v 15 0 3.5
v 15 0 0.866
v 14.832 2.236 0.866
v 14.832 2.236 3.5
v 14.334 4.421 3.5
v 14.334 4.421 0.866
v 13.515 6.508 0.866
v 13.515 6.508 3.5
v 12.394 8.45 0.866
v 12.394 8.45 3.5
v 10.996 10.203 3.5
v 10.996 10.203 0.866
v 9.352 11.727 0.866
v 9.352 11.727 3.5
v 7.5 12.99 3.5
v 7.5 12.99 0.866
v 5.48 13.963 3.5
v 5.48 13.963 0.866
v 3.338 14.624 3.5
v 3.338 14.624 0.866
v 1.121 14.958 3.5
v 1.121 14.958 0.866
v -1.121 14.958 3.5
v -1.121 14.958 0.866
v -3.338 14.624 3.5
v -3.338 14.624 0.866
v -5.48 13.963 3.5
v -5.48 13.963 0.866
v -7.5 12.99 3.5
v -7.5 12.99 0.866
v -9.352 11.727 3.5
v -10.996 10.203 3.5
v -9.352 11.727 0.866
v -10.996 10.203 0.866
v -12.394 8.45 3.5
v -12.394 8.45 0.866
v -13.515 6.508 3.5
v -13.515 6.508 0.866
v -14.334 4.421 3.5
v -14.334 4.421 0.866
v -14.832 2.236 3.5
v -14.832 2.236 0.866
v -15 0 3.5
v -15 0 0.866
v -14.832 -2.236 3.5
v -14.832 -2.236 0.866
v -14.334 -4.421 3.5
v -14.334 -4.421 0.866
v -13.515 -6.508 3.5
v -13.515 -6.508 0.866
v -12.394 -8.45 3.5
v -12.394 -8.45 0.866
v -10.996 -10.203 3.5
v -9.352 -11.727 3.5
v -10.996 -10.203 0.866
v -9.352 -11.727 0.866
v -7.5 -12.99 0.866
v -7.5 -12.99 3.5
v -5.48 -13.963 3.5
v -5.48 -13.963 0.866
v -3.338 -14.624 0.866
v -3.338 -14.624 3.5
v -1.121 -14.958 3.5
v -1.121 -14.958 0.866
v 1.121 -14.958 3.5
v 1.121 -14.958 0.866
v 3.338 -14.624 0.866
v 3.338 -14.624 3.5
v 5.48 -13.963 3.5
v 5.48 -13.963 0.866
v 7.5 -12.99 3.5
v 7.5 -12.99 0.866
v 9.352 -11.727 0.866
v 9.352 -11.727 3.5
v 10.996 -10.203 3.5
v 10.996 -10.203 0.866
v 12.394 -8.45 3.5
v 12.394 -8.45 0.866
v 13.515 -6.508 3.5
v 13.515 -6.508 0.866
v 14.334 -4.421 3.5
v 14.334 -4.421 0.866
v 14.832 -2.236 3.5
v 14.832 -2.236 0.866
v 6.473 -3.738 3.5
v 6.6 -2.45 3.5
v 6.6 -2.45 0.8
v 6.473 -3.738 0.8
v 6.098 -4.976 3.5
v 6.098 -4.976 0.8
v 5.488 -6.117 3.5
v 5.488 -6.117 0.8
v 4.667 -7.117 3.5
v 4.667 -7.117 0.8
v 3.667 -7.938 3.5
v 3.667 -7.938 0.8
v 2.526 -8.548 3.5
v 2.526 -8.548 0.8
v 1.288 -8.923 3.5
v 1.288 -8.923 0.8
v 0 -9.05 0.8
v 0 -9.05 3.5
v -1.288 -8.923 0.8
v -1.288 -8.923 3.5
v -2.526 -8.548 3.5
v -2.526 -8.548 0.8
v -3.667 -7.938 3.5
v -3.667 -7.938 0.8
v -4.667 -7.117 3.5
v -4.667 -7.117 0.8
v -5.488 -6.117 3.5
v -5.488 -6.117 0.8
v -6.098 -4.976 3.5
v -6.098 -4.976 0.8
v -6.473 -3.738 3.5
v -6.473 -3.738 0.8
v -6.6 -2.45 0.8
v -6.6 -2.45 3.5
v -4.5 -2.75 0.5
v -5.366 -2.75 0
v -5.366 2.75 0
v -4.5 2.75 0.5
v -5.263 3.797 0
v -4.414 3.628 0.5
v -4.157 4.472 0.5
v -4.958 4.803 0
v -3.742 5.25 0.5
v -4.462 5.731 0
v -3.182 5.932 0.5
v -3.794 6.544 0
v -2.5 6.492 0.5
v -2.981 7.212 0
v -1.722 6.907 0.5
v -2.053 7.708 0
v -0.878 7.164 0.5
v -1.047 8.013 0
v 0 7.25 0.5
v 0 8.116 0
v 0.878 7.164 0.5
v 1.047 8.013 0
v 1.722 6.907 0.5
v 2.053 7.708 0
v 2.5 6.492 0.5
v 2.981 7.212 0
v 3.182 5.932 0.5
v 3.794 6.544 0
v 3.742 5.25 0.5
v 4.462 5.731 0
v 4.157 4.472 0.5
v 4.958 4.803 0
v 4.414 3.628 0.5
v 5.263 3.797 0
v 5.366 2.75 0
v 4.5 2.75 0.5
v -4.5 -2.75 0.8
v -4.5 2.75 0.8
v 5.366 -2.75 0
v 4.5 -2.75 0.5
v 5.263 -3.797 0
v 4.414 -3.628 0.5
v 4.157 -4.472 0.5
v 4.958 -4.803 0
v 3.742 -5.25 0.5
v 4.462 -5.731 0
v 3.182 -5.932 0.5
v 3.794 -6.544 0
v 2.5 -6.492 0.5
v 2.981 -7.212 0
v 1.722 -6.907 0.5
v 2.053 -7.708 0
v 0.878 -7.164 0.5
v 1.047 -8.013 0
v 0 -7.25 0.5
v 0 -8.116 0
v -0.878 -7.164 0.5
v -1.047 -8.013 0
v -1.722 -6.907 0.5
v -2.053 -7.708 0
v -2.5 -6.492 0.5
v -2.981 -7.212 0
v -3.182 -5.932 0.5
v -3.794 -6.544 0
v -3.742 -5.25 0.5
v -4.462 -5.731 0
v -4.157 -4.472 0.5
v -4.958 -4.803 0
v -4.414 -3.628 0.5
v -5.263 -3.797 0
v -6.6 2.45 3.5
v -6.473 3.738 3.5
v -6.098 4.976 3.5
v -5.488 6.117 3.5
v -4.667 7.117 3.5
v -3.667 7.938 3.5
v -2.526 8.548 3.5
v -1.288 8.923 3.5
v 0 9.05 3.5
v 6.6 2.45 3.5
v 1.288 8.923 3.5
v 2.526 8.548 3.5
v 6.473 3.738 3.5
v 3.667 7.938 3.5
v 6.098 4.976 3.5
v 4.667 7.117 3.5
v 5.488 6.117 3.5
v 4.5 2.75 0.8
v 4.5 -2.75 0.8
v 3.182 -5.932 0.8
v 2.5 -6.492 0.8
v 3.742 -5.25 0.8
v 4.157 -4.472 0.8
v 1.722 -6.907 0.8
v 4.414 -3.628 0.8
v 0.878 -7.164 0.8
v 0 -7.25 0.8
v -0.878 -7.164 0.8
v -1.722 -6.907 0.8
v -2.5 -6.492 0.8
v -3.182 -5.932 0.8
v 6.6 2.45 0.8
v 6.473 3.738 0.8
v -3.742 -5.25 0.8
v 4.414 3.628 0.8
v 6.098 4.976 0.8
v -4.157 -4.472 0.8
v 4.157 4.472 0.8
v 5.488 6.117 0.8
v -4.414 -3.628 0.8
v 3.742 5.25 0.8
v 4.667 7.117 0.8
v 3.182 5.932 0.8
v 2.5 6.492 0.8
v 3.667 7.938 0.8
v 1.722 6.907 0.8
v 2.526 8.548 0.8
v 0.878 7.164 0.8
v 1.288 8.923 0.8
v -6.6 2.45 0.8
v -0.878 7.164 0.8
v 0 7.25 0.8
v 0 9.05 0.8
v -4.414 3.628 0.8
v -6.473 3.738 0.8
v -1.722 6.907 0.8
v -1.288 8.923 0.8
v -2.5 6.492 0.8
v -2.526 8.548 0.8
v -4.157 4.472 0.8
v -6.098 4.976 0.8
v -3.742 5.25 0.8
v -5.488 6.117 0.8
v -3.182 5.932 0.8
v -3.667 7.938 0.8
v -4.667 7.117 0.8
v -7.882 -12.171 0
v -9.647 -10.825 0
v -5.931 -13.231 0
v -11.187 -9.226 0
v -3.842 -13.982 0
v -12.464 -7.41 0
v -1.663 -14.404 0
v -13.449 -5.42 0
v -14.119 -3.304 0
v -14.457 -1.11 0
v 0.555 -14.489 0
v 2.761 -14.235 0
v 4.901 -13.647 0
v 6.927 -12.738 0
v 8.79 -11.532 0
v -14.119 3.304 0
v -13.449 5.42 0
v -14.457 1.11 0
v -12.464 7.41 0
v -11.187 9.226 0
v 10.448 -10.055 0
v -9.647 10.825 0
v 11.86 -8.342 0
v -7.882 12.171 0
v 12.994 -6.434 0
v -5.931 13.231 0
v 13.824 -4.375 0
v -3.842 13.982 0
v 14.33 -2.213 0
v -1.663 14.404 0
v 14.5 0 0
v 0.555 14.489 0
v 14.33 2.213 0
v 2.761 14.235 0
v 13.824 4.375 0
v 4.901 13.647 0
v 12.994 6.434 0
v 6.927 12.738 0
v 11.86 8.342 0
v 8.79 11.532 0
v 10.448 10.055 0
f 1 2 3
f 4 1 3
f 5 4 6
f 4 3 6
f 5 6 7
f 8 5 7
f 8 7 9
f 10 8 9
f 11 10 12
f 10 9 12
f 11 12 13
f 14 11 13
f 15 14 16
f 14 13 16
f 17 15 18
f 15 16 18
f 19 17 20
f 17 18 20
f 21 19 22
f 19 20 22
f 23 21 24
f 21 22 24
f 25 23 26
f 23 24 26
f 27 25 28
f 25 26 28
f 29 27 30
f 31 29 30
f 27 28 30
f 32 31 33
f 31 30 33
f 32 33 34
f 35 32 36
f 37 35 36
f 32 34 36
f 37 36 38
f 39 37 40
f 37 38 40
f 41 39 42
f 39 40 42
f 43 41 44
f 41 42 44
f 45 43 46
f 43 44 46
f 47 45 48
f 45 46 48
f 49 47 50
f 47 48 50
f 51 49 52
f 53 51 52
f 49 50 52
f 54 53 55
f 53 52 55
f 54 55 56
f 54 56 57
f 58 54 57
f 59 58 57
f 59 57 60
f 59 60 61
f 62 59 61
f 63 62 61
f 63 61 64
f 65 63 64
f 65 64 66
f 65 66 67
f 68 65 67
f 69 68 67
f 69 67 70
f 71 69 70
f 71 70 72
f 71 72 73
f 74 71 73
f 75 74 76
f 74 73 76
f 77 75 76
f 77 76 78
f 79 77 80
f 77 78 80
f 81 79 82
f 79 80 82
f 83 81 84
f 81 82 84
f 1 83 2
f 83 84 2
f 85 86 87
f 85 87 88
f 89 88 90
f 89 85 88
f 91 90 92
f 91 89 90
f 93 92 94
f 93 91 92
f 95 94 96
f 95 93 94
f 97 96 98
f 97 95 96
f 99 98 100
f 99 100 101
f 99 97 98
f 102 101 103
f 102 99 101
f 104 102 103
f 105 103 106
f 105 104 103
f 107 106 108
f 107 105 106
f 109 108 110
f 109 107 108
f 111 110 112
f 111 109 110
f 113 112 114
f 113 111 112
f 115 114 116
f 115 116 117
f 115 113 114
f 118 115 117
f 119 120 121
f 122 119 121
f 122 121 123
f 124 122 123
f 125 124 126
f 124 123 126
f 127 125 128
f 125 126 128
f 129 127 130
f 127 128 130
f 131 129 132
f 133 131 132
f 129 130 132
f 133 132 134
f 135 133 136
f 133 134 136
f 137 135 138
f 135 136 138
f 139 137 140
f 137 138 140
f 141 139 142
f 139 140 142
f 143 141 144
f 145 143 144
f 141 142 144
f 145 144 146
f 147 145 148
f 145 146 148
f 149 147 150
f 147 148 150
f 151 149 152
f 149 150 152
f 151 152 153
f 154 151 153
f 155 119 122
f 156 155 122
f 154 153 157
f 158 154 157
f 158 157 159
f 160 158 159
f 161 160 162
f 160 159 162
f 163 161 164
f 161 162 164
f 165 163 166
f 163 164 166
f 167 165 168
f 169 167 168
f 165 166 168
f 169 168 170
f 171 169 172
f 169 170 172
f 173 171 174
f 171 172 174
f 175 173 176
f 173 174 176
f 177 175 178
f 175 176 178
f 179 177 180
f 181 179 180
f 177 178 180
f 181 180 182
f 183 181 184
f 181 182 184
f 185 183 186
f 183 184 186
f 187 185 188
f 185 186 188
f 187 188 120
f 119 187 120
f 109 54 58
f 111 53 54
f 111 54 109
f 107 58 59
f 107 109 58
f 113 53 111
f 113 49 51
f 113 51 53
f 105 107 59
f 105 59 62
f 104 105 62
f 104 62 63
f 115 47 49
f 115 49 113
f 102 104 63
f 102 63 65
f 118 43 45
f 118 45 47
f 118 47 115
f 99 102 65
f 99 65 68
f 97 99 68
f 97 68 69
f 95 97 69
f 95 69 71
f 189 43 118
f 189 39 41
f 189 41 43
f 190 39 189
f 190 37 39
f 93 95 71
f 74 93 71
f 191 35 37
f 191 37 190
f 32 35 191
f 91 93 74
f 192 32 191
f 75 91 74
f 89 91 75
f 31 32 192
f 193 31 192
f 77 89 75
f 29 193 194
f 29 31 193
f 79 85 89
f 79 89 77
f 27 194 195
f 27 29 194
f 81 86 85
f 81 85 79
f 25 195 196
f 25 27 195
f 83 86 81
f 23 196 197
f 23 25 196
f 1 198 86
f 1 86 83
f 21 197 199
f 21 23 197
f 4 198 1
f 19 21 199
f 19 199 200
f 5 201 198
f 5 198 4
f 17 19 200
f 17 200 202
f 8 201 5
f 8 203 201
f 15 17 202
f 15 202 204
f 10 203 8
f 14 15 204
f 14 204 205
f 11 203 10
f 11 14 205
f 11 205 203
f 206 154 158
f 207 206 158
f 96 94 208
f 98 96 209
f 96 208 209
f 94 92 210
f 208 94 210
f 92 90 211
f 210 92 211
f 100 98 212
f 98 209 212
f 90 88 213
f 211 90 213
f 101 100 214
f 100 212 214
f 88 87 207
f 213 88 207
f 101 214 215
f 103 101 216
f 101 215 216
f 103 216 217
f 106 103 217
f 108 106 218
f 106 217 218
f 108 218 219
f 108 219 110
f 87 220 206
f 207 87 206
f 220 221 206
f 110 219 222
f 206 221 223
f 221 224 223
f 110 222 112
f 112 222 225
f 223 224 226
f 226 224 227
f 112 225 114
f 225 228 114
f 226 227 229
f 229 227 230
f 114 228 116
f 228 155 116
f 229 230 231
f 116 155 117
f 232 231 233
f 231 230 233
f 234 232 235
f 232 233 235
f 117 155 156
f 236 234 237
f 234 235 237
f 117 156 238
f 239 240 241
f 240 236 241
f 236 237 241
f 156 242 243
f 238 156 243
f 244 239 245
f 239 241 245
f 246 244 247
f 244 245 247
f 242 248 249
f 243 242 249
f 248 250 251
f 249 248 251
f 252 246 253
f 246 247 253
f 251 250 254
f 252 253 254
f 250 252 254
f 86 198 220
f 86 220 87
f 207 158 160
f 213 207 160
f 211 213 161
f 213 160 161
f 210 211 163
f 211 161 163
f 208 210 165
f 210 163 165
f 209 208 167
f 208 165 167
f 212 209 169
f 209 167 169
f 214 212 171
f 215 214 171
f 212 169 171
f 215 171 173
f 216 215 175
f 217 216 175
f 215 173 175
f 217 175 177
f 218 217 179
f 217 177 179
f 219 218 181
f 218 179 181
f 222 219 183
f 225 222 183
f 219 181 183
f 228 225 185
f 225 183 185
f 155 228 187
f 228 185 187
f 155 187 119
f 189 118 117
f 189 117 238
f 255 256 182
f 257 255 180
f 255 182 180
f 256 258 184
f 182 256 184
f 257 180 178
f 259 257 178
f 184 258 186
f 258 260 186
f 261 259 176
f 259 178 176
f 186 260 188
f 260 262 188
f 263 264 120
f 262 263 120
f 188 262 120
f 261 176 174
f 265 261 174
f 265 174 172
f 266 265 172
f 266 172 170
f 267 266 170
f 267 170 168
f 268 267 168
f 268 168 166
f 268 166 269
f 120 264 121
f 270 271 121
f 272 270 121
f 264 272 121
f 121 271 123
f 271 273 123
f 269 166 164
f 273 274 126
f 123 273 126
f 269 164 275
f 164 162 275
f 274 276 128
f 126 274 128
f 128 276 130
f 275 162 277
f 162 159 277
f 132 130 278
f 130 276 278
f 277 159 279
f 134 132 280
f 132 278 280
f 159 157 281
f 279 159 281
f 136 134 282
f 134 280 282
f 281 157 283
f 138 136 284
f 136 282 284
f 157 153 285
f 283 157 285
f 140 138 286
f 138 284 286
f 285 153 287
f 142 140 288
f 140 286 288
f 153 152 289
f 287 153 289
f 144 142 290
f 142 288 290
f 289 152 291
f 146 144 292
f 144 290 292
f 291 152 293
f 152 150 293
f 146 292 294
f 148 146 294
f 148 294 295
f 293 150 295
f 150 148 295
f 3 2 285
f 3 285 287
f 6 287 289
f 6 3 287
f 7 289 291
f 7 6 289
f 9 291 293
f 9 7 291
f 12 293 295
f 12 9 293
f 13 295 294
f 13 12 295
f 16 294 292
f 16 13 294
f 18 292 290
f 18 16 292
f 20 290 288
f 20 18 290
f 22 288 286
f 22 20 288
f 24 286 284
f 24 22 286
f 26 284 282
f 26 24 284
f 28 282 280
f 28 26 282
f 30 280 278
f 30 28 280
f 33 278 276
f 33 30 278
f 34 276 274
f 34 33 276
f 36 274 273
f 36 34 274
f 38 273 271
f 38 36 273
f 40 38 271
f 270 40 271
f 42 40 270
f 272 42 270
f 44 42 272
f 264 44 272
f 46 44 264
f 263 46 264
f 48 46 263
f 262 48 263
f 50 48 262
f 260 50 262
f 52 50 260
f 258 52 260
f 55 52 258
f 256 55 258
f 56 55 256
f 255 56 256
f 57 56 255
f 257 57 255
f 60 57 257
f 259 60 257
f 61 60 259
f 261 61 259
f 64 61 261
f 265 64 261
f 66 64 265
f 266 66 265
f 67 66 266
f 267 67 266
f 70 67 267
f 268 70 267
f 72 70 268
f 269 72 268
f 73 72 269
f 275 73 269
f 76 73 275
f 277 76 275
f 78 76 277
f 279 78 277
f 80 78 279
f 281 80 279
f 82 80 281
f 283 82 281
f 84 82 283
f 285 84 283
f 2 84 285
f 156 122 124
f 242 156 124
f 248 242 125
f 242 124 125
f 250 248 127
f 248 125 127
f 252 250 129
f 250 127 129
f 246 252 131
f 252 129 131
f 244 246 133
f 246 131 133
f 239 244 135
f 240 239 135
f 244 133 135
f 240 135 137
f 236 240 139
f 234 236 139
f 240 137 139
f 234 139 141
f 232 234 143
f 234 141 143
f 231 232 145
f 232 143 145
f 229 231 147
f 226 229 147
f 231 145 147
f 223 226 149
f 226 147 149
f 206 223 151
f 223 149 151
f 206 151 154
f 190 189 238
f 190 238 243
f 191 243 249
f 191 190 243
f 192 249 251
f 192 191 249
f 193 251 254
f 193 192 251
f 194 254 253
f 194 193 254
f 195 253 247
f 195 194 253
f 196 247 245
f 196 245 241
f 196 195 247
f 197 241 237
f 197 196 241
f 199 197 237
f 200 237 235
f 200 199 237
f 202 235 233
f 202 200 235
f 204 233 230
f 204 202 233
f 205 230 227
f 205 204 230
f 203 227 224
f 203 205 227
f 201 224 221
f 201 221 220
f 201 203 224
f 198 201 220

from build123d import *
from OCP.BRepFilletAPI import BRepFilletAPI_MakeChamfer

# Parameters (mm, degrees)
SKETCH_184_R           = 15
EXTRUDE_842_DEPTH      = 3.5
CUT_EXTRUDE_1179_DEPTH = 2.7
CHAMFER_1_SIZE         = 0.5
CHAMFER_1_SIZE2        = 0.866025404


with BuildPart() as part:
    # Sketch 184 → Extrude 842 (new body)
    with BuildSketch(Plane.XY):
        Circle(SKETCH_184_R)
        with BuildLine():
            Line((4.5, 2.75), (4.5, -2.75))
            ThreePointArc((4.5, -2.75), (0, -7.25), (-4.5, -2.75))
            Line((-4.5, -2.75), (-4.5, 2.75))
            ThreePointArc((-4.5, 2.75), (0, 7.25), (4.5, 2.75))
        make_face(mode=Mode.SUBTRACT)
    extrude(amount=EXTRUDE_842_DEPTH)

    # Эскиз1 → Cut-Extrude 1179 (cut)
    with BuildSketch(Plane.XY.offset(3.5)):
        with BuildLine():
            Line((6.6, 2.45), (6.6, -2.45))
            ThreePointArc((6.6, -2.45), (0, -9.05), (-6.6, -2.45))
            Line((-6.6, -2.45), (-6.6, 2.45))
            ThreePointArc((-6.6, 2.45), (0, 9.05), (6.6, 2.45))
        make_face()
    extrude(amount=-CUT_EXTRUDE_1179_DEPTH, mode=Mode.SUBTRACT)

    # Фаска1: one chamfer whose edges measure the first distance from different faces: ONE call of the kernel's chamfer builder (chamfer() names one face for all edges)
    chamfer_1_edges_1 = [part.edges().sort_by_distance(p)[0] for p in [
        (-15, 0, 0),
    ]]
    chamfer_1_side_1 = [part.faces().sort_by_distance(p)[0] for p in [
        (-14.575735931, 0, 0),
    ]]
    chamfer_1_edges_2 = [part.edges().sort_by_distance(p)[0] for p in [
        (0, 7.25, 0),
    ]]
    chamfer_1_side_2 = [part.faces().sort_by_distance(p)[0] for p in [
        (0, 7.25, 0.4),
    ]]
    chamfer_1_edges_3 = [part.edges().sort_by_distance(p)[0] for p in [
        (-4.5, 0, 0),
    ]]
    chamfer_1_side_3 = [part.faces().sort_by_distance(p)[0] for p in [
        (-4.5, 0, 0.4),
    ]]
    chamfer_1_edges_4 = [part.edges().sort_by_distance(p)[0] for p in [
        (0, -7.25, 0),
    ]]
    chamfer_1_side_4 = [part.faces().sort_by_distance(p)[0] for p in [
        (0, -7.25, 0.4),
    ]]
    chamfer_1_edges_5 = [part.edges().sort_by_distance(p)[0] for p in [
        (4.5, 0, 0),
    ]]
    chamfer_1_side_5 = [part.faces().sort_by_distance(p)[0] for p in [
        (4.5, 0, 0.4),
    ]]
    chamfer_1 = BRepFilletAPI_MakeChamfer(part.part.solid().wrapped)
    for e in chamfer_1_edges_1:
        chamfer_1.Add(CHAMFER_1_SIZE, CHAMFER_1_SIZE2, e.wrapped, chamfer_1_side_1[0].wrapped)  # the first distance lies on this face
    for e in chamfer_1_edges_2:
        chamfer_1.Add(CHAMFER_1_SIZE, CHAMFER_1_SIZE2, e.wrapped, chamfer_1_side_2[0].wrapped)  # the first distance lies on this face
    for e in chamfer_1_edges_3:
        chamfer_1.Add(CHAMFER_1_SIZE, CHAMFER_1_SIZE2, e.wrapped, chamfer_1_side_3[0].wrapped)  # the first distance lies on this face
    for e in chamfer_1_edges_4:
        chamfer_1.Add(CHAMFER_1_SIZE, CHAMFER_1_SIZE2, e.wrapped, chamfer_1_side_4[0].wrapped)  # the first distance lies on this face
    for e in chamfer_1_edges_5:
        chamfer_1.Add(CHAMFER_1_SIZE, CHAMFER_1_SIZE2, e.wrapped, chamfer_1_side_5[0].wrapped)  # the first distance lies on this face
    add(Compound.cast(chamfer_1.Shape()), mode=Mode.REPLACE)


solid = part.part
